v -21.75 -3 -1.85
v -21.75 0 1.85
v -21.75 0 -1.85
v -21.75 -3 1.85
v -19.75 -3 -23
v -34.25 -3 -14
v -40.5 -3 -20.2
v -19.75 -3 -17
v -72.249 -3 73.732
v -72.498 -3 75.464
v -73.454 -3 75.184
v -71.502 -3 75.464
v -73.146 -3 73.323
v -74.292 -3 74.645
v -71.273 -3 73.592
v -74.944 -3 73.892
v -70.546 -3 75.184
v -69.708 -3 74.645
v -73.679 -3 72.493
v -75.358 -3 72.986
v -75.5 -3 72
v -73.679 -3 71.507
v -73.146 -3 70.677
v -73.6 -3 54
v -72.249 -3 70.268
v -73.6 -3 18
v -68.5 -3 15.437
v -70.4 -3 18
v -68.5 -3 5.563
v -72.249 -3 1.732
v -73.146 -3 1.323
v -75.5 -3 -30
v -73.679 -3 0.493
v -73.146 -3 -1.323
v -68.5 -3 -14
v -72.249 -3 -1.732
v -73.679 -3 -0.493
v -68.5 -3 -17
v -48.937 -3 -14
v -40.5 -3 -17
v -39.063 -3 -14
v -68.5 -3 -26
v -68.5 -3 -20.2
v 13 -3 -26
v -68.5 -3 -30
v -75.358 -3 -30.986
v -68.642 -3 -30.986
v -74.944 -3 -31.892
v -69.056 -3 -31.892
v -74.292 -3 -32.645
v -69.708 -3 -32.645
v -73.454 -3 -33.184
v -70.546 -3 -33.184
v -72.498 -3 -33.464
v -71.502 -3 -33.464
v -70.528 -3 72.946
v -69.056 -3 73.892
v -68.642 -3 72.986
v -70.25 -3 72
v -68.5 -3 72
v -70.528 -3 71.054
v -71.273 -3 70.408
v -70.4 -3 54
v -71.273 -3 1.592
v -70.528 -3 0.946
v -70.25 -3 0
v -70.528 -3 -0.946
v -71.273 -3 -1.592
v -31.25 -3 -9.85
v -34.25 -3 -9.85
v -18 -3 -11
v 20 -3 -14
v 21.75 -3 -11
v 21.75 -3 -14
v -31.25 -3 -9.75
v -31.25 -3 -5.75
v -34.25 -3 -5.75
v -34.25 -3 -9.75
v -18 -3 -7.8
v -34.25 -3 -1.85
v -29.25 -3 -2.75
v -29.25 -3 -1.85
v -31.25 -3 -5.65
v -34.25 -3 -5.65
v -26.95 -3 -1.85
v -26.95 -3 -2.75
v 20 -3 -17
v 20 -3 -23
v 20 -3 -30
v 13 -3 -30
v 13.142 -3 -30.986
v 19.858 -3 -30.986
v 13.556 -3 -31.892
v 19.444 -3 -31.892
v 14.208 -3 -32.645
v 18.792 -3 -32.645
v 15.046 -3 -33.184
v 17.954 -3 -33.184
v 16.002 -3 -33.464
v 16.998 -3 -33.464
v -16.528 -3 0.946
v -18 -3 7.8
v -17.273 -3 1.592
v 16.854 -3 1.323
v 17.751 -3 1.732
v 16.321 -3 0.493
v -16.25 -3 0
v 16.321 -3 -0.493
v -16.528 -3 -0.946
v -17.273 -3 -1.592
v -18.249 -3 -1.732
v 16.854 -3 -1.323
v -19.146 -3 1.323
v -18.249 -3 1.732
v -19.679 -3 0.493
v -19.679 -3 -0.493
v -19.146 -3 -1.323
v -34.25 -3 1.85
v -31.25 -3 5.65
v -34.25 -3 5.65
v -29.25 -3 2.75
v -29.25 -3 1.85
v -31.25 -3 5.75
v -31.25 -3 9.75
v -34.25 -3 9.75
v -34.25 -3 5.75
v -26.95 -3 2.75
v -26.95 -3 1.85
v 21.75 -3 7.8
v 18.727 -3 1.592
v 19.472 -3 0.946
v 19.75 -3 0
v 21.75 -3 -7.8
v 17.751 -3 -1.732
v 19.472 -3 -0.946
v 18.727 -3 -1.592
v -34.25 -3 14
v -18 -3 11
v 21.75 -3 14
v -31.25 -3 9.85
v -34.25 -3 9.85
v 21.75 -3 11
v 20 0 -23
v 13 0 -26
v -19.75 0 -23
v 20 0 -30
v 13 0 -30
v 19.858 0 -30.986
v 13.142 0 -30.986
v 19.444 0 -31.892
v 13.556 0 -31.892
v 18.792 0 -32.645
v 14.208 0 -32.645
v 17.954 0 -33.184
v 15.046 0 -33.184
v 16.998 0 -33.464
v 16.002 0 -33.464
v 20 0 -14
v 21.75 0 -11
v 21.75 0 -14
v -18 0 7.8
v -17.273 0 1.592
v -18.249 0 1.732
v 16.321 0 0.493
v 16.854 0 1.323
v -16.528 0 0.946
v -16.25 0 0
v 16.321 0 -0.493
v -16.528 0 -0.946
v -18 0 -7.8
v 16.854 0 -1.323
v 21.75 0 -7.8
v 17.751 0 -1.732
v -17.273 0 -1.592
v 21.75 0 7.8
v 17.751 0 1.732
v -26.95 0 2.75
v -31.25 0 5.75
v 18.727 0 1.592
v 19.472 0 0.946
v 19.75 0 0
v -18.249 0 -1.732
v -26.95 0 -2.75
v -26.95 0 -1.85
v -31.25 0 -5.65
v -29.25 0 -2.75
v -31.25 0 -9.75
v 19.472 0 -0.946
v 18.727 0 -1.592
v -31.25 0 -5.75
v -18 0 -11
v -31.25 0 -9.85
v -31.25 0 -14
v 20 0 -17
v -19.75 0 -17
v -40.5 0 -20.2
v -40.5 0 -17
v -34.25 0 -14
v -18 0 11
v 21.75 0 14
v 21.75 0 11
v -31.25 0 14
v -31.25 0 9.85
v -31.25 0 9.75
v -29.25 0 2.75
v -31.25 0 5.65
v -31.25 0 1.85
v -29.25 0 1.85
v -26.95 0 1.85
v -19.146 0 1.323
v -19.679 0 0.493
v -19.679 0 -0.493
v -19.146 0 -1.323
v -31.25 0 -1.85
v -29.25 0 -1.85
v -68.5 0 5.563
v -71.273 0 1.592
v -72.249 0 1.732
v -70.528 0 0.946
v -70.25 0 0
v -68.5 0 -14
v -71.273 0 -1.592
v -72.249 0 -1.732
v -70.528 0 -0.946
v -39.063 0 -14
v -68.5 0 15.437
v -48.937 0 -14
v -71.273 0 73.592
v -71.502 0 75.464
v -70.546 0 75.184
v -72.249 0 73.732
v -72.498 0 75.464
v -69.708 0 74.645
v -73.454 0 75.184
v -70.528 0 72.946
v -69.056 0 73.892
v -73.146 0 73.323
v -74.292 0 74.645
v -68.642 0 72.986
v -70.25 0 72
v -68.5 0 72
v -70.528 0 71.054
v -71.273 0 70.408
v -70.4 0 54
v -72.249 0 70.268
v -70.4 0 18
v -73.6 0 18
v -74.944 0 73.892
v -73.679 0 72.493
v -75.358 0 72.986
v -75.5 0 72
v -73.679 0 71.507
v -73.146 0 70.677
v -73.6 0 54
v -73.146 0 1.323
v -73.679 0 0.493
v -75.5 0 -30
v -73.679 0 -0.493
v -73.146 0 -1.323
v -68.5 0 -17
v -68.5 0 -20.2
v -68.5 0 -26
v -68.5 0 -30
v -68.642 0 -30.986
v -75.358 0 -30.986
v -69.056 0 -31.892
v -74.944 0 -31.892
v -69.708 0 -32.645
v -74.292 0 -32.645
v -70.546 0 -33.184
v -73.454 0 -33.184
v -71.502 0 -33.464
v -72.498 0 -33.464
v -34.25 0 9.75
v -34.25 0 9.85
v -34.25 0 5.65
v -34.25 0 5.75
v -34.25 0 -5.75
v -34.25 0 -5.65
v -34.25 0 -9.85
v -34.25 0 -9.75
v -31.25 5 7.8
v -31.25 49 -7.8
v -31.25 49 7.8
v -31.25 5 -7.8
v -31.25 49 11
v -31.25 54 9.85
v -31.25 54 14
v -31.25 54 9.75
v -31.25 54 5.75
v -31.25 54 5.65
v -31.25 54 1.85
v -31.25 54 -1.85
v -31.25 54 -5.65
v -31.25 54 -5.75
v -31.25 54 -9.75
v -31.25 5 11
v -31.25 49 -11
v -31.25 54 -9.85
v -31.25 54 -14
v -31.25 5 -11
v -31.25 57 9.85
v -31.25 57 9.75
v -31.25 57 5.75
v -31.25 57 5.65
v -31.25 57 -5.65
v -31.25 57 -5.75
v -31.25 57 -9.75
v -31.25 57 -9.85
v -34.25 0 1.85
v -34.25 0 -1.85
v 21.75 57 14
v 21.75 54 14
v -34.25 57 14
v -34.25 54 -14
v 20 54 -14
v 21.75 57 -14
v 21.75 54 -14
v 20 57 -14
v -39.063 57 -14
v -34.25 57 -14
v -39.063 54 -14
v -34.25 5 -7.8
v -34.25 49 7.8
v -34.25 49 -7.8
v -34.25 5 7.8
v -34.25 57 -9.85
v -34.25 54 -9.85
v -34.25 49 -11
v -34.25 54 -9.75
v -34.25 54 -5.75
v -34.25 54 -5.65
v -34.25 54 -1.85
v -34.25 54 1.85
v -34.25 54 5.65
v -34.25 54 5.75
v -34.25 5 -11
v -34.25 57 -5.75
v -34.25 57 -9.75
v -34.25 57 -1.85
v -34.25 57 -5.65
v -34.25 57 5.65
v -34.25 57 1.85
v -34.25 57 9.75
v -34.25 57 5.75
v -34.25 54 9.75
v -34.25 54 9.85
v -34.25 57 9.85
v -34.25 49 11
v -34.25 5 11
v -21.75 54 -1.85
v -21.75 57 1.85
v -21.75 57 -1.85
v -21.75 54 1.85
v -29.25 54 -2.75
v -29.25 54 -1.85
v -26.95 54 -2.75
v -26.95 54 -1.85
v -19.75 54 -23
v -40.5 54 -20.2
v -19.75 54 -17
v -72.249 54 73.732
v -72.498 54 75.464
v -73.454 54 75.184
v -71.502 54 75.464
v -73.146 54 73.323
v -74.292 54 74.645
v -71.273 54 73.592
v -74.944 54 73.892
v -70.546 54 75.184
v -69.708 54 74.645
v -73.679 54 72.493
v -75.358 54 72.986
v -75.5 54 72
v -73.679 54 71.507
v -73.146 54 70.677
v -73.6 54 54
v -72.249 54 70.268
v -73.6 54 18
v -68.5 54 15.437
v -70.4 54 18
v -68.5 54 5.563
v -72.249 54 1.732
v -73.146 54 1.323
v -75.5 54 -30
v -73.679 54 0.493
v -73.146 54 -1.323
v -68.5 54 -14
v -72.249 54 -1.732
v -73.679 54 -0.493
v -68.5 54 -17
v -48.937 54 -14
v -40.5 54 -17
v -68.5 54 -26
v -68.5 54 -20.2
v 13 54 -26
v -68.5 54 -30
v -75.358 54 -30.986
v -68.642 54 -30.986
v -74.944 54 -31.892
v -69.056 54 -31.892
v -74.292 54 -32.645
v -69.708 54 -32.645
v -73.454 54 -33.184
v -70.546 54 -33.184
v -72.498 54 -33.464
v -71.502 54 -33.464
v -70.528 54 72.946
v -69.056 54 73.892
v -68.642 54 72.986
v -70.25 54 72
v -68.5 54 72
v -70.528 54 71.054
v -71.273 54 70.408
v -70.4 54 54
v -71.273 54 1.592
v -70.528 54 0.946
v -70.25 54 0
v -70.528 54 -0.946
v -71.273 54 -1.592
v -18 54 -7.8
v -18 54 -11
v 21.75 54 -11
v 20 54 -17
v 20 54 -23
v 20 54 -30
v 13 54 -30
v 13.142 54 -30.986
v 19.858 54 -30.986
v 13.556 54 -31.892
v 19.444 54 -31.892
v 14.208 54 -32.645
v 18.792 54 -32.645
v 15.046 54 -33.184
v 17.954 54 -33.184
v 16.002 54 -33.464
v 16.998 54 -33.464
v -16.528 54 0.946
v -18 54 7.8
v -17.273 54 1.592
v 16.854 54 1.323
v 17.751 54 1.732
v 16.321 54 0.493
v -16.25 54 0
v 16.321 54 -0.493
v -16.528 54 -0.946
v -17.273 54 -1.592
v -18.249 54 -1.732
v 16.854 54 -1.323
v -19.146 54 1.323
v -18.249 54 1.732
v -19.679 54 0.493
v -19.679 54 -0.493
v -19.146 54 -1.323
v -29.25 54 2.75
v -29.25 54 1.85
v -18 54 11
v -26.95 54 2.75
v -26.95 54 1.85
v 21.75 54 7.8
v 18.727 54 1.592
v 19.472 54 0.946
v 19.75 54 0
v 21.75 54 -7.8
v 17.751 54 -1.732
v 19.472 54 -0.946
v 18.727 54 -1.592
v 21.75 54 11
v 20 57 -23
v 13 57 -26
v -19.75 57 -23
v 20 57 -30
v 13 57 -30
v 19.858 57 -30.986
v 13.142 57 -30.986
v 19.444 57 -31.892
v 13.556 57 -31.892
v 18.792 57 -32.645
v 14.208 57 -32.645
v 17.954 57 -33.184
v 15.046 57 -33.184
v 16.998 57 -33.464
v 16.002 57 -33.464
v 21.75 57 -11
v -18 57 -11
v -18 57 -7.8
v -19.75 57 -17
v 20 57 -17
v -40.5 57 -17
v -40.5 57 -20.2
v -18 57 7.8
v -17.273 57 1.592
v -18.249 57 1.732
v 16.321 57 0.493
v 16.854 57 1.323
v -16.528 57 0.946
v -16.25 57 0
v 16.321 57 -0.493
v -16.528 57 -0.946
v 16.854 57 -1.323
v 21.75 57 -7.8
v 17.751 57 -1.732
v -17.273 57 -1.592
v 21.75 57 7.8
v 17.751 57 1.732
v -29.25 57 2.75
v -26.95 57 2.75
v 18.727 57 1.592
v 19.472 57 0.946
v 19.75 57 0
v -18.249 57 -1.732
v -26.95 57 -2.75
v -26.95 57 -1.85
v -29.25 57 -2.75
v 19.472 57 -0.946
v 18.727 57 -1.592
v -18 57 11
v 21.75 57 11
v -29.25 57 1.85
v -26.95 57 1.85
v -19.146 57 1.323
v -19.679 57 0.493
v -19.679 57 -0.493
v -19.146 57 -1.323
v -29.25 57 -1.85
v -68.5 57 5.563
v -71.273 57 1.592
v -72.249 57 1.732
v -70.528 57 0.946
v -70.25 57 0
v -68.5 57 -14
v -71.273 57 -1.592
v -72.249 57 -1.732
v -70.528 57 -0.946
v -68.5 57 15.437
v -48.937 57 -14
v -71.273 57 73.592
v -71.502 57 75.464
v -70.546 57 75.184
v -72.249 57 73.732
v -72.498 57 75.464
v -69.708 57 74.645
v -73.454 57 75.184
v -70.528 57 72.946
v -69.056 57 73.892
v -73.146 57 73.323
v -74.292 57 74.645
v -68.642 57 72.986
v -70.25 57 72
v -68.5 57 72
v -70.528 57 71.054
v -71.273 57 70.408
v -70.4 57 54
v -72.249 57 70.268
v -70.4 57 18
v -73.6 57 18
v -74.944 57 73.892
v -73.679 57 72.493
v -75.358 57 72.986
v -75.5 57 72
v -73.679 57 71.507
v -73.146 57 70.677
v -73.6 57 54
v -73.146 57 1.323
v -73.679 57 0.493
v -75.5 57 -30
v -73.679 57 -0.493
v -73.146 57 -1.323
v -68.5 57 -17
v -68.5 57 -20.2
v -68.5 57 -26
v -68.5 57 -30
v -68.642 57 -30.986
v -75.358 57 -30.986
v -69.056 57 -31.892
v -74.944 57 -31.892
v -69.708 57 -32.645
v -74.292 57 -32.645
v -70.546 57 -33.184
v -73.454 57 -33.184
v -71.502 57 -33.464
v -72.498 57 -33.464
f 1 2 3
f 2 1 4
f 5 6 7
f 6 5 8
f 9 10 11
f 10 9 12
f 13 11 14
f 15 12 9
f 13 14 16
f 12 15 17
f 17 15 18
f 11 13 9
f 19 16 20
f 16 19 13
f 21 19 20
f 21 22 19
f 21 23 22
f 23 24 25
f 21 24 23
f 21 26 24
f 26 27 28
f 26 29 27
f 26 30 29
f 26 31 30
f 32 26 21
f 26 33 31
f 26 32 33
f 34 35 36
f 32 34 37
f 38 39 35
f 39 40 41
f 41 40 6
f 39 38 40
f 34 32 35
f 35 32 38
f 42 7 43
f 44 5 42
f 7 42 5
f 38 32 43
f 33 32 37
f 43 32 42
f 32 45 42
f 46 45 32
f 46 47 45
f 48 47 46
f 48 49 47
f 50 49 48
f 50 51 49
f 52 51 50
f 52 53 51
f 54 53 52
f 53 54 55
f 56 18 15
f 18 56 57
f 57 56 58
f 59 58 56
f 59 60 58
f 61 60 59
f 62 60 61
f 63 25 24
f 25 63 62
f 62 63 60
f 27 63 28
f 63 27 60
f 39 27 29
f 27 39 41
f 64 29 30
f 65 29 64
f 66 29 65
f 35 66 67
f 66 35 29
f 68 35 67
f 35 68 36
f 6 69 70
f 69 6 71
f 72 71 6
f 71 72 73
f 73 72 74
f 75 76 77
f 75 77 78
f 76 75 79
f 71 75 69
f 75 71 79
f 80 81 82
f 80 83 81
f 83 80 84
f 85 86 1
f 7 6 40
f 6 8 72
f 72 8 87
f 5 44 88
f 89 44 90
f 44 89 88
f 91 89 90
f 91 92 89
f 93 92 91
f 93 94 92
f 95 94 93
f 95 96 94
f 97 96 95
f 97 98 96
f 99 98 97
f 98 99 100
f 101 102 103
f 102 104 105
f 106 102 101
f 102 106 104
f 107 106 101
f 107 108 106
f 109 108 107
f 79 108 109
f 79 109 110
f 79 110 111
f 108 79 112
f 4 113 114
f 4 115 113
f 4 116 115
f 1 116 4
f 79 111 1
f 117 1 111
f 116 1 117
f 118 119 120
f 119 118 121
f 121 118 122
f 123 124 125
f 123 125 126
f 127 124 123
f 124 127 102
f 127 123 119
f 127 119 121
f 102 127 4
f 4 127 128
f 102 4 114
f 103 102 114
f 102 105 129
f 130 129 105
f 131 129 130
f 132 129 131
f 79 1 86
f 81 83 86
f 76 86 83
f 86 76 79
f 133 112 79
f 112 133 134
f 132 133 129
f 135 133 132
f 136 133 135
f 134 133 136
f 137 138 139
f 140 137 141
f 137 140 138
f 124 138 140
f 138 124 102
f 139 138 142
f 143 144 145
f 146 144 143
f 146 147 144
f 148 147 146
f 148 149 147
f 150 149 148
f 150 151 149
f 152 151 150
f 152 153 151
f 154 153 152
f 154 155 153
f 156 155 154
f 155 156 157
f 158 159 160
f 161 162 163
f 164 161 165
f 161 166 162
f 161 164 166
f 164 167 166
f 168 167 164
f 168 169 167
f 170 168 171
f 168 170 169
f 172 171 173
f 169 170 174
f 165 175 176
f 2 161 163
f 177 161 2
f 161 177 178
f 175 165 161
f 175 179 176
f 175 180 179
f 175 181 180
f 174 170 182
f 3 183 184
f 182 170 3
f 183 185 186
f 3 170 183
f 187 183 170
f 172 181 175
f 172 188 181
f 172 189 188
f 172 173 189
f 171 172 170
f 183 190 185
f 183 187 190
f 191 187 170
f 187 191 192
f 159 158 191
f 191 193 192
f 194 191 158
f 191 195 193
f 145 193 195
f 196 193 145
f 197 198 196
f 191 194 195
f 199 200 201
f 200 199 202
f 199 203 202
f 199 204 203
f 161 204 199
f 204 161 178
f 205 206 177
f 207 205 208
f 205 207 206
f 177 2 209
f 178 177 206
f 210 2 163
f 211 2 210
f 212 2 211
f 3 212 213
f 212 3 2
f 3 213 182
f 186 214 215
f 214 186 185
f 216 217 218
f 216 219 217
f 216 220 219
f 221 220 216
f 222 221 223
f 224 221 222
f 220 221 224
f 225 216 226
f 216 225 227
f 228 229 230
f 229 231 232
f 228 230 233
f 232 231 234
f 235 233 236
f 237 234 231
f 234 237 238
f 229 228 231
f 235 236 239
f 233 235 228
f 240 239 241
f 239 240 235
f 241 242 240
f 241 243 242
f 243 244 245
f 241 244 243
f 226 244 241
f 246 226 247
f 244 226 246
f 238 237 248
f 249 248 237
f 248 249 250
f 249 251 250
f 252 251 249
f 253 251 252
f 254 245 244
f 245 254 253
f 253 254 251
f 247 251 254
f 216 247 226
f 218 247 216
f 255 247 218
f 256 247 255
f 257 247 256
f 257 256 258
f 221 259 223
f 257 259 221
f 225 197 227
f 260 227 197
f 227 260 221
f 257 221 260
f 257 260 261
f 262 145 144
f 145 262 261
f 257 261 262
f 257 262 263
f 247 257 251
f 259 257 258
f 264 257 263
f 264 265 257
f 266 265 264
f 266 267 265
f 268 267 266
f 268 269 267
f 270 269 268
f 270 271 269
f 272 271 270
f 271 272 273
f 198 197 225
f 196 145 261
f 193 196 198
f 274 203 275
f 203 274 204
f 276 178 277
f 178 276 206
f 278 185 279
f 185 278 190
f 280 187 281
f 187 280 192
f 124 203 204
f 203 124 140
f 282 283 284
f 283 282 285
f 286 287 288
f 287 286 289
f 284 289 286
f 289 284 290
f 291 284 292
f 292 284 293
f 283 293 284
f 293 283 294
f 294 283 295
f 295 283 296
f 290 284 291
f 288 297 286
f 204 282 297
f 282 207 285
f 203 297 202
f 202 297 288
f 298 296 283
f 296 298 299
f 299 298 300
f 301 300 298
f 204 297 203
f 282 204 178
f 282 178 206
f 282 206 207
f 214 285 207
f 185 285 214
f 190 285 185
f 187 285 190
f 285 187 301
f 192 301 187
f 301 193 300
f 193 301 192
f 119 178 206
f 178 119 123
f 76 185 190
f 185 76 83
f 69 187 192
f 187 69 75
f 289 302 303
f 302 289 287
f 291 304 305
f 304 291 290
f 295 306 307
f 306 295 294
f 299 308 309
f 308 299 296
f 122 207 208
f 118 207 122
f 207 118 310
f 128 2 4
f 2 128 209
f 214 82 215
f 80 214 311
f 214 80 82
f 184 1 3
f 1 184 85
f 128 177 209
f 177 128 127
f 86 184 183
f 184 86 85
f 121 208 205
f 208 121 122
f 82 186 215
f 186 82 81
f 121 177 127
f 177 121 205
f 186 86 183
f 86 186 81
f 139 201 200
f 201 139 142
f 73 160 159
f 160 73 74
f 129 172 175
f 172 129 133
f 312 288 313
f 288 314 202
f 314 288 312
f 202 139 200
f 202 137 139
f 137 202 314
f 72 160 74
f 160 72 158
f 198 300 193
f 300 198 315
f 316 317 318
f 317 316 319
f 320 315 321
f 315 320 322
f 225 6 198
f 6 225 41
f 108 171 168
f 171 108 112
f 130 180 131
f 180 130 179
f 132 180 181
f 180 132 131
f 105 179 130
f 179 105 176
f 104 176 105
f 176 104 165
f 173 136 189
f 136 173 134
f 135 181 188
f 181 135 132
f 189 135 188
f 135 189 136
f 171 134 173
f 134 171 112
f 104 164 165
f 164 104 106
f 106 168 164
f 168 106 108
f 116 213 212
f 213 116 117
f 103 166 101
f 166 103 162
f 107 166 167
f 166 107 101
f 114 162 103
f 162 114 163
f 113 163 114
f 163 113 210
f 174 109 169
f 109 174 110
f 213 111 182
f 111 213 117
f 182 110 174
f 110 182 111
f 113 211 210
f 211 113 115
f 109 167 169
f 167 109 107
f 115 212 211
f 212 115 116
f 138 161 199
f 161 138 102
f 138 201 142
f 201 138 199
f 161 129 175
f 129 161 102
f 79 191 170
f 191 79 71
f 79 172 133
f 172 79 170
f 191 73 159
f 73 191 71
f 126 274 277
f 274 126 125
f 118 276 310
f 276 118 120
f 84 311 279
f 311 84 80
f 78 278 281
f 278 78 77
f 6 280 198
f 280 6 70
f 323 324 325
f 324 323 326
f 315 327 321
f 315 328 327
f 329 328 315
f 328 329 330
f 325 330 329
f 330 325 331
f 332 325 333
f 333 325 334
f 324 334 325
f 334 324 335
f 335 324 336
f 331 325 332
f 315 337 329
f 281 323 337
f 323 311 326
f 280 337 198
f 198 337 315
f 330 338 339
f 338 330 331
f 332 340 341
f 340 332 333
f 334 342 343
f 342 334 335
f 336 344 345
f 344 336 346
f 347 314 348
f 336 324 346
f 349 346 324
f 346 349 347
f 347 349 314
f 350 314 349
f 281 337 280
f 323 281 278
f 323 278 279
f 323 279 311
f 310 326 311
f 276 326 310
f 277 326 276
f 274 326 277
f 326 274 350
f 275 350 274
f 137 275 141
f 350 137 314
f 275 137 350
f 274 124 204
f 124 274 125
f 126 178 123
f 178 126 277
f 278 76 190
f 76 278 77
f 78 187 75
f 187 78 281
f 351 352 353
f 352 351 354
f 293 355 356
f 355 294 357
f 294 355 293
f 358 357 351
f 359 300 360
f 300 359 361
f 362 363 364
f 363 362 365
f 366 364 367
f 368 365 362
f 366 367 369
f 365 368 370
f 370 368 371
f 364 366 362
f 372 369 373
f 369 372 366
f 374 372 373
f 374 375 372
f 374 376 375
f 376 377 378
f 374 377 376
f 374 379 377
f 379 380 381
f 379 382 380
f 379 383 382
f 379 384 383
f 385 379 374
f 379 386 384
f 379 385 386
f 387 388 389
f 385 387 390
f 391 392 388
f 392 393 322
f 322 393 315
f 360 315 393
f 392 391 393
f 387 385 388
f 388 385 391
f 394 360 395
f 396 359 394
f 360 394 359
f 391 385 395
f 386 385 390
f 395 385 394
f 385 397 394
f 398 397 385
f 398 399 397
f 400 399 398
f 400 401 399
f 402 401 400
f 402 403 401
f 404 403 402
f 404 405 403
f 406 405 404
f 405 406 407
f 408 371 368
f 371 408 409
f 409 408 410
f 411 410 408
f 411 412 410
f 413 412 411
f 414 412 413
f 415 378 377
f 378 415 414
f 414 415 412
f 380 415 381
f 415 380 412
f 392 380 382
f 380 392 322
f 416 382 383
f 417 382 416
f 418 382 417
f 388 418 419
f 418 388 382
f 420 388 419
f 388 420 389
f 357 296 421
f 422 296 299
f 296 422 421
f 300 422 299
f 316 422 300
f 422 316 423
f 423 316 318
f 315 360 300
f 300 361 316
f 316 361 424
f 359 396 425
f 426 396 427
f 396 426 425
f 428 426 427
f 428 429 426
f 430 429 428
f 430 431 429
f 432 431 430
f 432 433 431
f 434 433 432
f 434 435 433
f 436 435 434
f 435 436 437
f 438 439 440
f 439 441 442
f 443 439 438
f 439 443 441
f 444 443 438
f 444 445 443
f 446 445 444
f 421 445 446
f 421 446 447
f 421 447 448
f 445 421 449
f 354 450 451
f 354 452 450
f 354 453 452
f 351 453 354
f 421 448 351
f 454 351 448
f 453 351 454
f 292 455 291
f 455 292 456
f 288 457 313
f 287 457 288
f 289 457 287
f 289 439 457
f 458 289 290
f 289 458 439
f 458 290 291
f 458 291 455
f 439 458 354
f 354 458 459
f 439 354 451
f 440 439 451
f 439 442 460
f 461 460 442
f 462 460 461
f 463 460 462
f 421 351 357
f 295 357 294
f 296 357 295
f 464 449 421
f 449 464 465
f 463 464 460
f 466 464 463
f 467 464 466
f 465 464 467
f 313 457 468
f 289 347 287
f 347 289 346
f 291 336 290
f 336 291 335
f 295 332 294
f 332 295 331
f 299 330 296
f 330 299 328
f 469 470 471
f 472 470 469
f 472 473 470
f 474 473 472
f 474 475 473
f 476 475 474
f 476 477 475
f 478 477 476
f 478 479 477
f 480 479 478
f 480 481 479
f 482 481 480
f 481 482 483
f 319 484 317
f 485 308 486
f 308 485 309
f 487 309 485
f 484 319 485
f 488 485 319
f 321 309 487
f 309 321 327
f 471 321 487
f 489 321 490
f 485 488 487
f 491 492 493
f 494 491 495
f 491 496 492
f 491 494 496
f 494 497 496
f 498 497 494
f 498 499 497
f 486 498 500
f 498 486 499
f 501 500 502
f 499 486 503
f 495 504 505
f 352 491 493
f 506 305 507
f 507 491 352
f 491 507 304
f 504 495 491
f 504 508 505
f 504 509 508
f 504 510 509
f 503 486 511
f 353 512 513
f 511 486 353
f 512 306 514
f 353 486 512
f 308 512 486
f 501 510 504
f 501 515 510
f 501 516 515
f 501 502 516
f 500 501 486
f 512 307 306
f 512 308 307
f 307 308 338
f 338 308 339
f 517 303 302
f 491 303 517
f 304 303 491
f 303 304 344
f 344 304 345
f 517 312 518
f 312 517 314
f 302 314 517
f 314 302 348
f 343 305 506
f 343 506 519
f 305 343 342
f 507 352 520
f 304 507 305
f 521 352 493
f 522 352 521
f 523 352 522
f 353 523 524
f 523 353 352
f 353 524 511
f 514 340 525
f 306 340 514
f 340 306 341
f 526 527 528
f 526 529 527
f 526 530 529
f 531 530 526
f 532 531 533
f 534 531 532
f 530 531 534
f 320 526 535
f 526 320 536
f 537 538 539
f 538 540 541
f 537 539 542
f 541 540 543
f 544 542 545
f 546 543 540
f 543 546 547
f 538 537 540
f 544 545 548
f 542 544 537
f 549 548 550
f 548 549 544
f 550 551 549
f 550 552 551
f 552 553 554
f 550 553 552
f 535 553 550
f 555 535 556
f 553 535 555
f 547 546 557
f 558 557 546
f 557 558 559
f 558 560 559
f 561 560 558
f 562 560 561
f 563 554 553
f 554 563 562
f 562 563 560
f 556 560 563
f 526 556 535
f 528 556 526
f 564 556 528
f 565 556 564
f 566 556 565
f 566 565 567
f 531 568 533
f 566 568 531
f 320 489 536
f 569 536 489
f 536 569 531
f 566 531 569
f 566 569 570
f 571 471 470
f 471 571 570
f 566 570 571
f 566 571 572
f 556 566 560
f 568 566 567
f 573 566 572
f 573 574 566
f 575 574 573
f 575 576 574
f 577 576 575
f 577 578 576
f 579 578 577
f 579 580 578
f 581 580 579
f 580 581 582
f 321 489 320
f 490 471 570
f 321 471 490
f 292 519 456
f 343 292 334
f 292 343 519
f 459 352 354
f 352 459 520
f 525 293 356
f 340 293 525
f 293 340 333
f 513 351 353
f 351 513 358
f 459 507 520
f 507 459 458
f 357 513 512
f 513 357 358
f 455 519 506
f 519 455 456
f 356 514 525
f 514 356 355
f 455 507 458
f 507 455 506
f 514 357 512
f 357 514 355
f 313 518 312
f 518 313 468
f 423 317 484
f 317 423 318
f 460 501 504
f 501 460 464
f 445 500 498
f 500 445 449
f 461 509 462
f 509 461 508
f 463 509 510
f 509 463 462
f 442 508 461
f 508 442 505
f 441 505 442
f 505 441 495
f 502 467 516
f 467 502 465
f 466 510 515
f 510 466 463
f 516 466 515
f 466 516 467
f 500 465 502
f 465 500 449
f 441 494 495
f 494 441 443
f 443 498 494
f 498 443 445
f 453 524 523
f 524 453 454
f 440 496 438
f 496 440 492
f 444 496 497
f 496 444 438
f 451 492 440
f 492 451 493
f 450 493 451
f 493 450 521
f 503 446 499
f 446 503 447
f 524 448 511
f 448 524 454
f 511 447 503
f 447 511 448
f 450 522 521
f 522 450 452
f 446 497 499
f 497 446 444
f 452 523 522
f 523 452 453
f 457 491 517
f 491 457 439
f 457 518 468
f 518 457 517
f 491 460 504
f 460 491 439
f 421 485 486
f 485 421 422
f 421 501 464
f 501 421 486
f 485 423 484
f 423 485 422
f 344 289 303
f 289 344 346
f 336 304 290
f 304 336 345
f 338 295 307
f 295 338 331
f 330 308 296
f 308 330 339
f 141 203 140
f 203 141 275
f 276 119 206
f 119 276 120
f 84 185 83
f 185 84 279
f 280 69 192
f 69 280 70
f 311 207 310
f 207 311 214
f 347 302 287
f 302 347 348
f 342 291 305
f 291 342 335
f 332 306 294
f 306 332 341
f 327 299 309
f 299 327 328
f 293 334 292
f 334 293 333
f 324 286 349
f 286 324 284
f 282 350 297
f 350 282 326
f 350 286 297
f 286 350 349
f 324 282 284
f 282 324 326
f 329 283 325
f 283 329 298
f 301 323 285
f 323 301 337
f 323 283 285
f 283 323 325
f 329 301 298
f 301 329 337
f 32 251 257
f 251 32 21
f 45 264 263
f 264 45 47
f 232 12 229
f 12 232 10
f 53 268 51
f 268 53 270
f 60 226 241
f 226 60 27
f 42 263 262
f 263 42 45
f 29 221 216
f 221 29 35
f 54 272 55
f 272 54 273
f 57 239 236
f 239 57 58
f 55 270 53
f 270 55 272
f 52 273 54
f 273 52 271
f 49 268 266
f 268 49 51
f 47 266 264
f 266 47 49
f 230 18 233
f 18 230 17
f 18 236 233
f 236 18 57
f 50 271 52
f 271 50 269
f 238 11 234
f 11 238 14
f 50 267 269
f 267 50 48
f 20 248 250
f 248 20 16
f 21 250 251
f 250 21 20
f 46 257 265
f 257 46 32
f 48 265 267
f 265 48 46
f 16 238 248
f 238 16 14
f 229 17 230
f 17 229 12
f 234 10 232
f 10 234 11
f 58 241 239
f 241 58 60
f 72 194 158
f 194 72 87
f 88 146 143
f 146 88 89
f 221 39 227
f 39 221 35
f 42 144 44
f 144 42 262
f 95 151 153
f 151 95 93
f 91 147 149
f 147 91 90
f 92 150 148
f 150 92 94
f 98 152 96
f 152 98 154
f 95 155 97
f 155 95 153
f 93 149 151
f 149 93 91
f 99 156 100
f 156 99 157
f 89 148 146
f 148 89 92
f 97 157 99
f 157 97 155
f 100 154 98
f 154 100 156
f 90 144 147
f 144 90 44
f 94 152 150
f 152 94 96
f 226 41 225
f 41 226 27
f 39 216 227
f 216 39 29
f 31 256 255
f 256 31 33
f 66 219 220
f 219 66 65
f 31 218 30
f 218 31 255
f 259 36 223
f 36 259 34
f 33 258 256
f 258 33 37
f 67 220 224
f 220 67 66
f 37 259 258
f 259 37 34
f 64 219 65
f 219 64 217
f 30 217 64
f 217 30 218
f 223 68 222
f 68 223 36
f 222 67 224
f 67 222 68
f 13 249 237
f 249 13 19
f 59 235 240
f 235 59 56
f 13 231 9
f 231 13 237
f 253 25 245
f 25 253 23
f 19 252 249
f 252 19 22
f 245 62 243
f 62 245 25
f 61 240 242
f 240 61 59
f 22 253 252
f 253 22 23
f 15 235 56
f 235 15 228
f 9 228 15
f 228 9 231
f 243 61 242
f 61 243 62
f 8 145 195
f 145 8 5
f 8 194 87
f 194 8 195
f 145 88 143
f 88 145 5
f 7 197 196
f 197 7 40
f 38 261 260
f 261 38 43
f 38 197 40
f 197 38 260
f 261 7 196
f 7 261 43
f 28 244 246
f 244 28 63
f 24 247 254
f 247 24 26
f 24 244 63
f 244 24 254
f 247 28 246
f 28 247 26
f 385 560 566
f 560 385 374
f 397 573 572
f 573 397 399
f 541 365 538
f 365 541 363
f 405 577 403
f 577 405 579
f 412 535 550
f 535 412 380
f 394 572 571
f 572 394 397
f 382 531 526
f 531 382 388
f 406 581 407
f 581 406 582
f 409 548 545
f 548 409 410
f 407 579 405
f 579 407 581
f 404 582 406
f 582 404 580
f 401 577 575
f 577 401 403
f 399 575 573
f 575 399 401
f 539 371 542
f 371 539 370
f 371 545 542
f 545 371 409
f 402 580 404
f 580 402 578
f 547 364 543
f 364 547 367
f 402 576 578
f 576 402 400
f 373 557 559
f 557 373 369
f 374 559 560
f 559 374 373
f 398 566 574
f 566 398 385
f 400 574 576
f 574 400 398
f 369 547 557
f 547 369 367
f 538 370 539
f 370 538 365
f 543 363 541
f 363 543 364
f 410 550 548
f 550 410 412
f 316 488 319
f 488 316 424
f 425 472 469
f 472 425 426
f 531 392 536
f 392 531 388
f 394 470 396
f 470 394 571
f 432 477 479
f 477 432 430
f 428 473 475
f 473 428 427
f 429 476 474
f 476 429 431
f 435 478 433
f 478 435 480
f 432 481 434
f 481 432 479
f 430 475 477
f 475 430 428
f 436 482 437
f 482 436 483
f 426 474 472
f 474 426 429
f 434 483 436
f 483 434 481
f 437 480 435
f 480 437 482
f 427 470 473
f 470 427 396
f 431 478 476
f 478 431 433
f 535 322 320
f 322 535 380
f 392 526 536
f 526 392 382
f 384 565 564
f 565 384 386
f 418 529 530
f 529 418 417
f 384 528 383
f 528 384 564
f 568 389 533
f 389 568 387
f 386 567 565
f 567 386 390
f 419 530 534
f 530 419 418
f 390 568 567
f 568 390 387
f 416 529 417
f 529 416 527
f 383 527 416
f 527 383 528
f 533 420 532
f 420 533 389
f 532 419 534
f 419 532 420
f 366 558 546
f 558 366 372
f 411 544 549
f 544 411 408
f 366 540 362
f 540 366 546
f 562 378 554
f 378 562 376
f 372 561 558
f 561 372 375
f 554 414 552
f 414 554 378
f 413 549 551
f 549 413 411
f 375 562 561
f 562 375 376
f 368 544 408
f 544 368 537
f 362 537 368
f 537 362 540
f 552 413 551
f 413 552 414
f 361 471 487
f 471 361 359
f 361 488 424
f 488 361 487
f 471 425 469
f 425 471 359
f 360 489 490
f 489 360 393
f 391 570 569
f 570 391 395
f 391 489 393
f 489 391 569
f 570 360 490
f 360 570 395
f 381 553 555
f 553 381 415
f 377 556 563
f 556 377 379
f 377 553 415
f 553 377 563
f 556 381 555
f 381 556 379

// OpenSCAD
/**
 * This is an open source fixture design based on a chebyshev linkage
 *
 * Free for all uses
 * Tiny Labs Inc
 *  2016
 */
 $fs = 1;
 
 // Material properties
 // Acrylic 0.118" = 3mm
 acrylic_th = 3;
 acrylic_kerf = 0.2;
 acrylic_id = acrylic_th + acrylic_kerf;
 
 // Active work area
 // Defining this will change the rest of the parameters
 // Tyler dimensions
 warea_x = 44;  // 1.7"
 warea_y = 36;  // 1.4"
 // keysy dimensions
 //warea_x = 28;
 //warea_y = 45;

 // Pivot holes
 pivot_r = 4;
 
 // Screw holes
 screw_r = 3.5 / 2;
 screw_z = 10.5;
 screw_head_z = 3;
 
 // Common lip around holes
 hlip = 2;
 
 // Interlock material
 interlock_th = 3;
 
 // Tongue and groove parameters
 tng_w = 4;
 tng_id = tng_w + acrylic_kerf;
 tng_offset = 4;
 
 // Tnut depth
 tnut_ypad = 0.2;
 tnut_zpad = 2;
 tnut_y = (screw_r * 2) + tnut_ypad;
 tnut_depth = screw_z - acrylic_th + tnut_zpad;
 tnut_grip = 2;
 tnut_nut_x = 5.5;
 tnut_nut_z = 2.3;
 
 // Pogo z depth
 pogo_z = 22;
 pogo_r = 1.85 / 2;
 
 
 // Do not edit these!!
 //

 // Core geometry
 L3 = warea_y;
 L2 = 2.5 * L3;
 L1 = 2 * L3;
 
 // Head parameters
 head_pad_x1 = screw_r + hlip;
 head_pad_x2 = screw_r + hlip + tnut_depth;
 head_x = L3 + head_pad_x1 + head_pad_x2;
 head_y =  pogo_z + 2 * interlock_th;
 head_pad_y = screw_head_z + 2;
 head_back_w = 2 * acrylic_th + 2 * head_pad_y + warea_x;

 // Insert dimensions
 insert_y = L3 + head_pad_x1;
 //insert_x = 
 insert_z = 2 * acrylic_th;
 
 // Base parameters
 base_feet = 4;
 base_th = 2 * acrylic_th + 2 * interlock_th;
 
 module tng_p ()
 {
     translate ([-acrylic_th, screw_r + tng_offset, 0])
     cube ([acrylic_th, tng_w, acrylic_th]);
     translate ([-acrylic_th, -screw_r - tng_w - tng_offset, 0])
     cube ([acrylic_th, tng_w, acrylic_th]);
 }

 module tng_n ()
 {
     translate ([0, screw_r + tng_offset - (acrylic_kerf/2), 0])
     cube ([acrylic_th, tng_id, acrylic_th]);
     translate ([0, -screw_r - tng_id - tng_offset + (acrylic_kerf/2), 0])
     cube ([acrylic_th, tng_id, acrylic_th]);

     // Remove screw hole
     translate ([0, -tnut_y/2, 0])
     cube ([acrylic_th, tnut_y, acrylic_th]);
 }
 
 module tnut () {
     translate ([0, -tnut_y / 2, 0])
     cube ([tnut_depth, tnut_y, acrylic_th]);
     translate ([tnut_grip, -tnut_nut_x/2, 0])
     cube ([tnut_nut_z, tnut_nut_x, acrylic_th]);
 }
 
 module head_side ()
 {
     difference () {
        translate([-(L3 / 2) - head_pad_x2, -head_y / 2, 0])
        cube ([head_x, head_y, acrylic_th]);
         
         // Remove swivel holes
         translate ([L3 / 2, 0, 0])
         cylinder (r = screw_r, h = acrylic_th);
         translate ([-L3 / 2, 0, 0])
         cylinder (r = screw_r, h = acrylic_th);
         
         // Remove slots
         translate ([-L3 / 2, (head_y / 2) - (interlock_th) - acrylic_id, 0])
         cube ([insert_y, acrylic_id, acrylic_th]); 
         translate ([-L3 / 2, -(head_y / 2) + (interlock_th), 0])
         cube ([insert_y, acrylic_id, acrylic_th]);
         
         // Remove tnut slot
         translate ([-L3/2 - head_pad_x2, 0, 0])
         tnut ();
     }
     
     // Add tongue and groove
     translate ([-L3/2 - head_pad_x2, 0, 0])
     tng_p ();
 }
 
 module head_back ()
 {
     difference () {
        translate ([-head_back_w/2, -head_y/2, 0])
        cube ([head_back_w, head_y, acrylic_th]);
         
         // Remove tng slots
         translate ([-head_back_w/2, 0, 0])
         tng_n ();
         translate ([head_back_w/2 - acrylic_th, 0, 0])
         tng_n ();

         // Remove slots for pogo carriers
         translate ([0, head_y/2 - interlock_th - (acrylic_id / 2), acrylic_th/2])
         cube ([warea_x, acrylic_id, acrylic_th], center = true);
         translate ([0, -(head_y/2 - interlock_th - (acrylic_id / 2)), acrylic_th/2])
         cube ([warea_x, acrylic_id, acrylic_th], center = true);
     }
 }
 
 module stand_side ()
 {
    difference () {
        
        union () {
            hull () {
                translate ([0, L1 + head_y / 2, 0])
                cylinder (r = screw_r * 2, h = acrylic_th);
                translate ([0, -base_th - base_feet, 0])
                cylinder (r = screw_r * 2, h = acrylic_th);
            }
            
            // Add base cube
            translate ([0, -base_th, 0])
            cube ([L2 + hlip, base_th, acrylic_th]);
            
            // Add foot
            translate ([L2 + hlip - (screw_r * 2), 0, 0])
            hull () {
                translate ([0, -(screw_r * 2), 0])
                cylinder (r = screw_r * 2, h = acrylic_th);
                translate ([0, -base_th - base_feet, 0])
                cylinder (r = screw_r * 2, h = acrylic_th);                
            }
            
            // Add crossbar support
            hull () {
                translate ([0, head_y, 0])
                cylinder (r = screw_r * 2, h = acrylic_th);
                translate ([head_y + 2 * screw_r, -(2 * screw_r), 0])
                cylinder (r = screw_r * 2, h = acrylic_th);
            }
        }
        
        // Remove mount holes
        translate ([0, head_y / 2, 0])
        cylinder (r = screw_r, h = acrylic_th);
        translate ([0, L1 + head_y / 2, 0])
        cylinder (r = screw_r, h = acrylic_th);
        
        // Remove carrier slots
        translate ([(L2 + hlip) - insert_y, -insert_z - interlock_th, 0])
        cube ([insert_y, insert_z, acrylic_th]);
        
        // Remove bottom support slot
        translate ([screw_r * 2, -acrylic_id - interlock_th, 0]) 
        cube ([head_y, acrylic_id, acrylic_th]);
        
        // Remove back support slot
        translate ([-acrylic_id/2, head_y / 2 + (L1 / 4), 0])
        cube ([acrylic_id, L1 / 2, acrylic_th]);
    }
    
 }
 
 if (1) {
 // sides
 translate ([0, head_back_w - acrylic_th, 0])
 rotate ([90, 0, 0])
 head_side ();
 rotate ([90, 0, 0])
 head_side (); 

 // back
 translate ([-(L3 /2) - head_pad_x2 - acrylic_th, head_back_w/2 - acrylic_th, 0])
 rotate ([0, 90, 0])
 rotate ([0, 0, 90])
 head_back ();
     
 // Side stands
 translate ([-L2 + (L3/2), 0, -head_y/2])
 rotate ([90, 0, 0])
 stand_side ();
 translate ([0, head_back_w - acrylic_th, 0])
 translate ([-L2 + (L3/2), 0, -head_y/2])
 rotate ([90, 0, 0])
 stand_side ();
 } 
 
 // Testing
 if (0) {
 //tnut ();
 //tng_p ();
 //tng_n ();
 //head_back ();
 //translate ([0, 0, 10])
 //head_side ();
 stand_side ();     
 }
